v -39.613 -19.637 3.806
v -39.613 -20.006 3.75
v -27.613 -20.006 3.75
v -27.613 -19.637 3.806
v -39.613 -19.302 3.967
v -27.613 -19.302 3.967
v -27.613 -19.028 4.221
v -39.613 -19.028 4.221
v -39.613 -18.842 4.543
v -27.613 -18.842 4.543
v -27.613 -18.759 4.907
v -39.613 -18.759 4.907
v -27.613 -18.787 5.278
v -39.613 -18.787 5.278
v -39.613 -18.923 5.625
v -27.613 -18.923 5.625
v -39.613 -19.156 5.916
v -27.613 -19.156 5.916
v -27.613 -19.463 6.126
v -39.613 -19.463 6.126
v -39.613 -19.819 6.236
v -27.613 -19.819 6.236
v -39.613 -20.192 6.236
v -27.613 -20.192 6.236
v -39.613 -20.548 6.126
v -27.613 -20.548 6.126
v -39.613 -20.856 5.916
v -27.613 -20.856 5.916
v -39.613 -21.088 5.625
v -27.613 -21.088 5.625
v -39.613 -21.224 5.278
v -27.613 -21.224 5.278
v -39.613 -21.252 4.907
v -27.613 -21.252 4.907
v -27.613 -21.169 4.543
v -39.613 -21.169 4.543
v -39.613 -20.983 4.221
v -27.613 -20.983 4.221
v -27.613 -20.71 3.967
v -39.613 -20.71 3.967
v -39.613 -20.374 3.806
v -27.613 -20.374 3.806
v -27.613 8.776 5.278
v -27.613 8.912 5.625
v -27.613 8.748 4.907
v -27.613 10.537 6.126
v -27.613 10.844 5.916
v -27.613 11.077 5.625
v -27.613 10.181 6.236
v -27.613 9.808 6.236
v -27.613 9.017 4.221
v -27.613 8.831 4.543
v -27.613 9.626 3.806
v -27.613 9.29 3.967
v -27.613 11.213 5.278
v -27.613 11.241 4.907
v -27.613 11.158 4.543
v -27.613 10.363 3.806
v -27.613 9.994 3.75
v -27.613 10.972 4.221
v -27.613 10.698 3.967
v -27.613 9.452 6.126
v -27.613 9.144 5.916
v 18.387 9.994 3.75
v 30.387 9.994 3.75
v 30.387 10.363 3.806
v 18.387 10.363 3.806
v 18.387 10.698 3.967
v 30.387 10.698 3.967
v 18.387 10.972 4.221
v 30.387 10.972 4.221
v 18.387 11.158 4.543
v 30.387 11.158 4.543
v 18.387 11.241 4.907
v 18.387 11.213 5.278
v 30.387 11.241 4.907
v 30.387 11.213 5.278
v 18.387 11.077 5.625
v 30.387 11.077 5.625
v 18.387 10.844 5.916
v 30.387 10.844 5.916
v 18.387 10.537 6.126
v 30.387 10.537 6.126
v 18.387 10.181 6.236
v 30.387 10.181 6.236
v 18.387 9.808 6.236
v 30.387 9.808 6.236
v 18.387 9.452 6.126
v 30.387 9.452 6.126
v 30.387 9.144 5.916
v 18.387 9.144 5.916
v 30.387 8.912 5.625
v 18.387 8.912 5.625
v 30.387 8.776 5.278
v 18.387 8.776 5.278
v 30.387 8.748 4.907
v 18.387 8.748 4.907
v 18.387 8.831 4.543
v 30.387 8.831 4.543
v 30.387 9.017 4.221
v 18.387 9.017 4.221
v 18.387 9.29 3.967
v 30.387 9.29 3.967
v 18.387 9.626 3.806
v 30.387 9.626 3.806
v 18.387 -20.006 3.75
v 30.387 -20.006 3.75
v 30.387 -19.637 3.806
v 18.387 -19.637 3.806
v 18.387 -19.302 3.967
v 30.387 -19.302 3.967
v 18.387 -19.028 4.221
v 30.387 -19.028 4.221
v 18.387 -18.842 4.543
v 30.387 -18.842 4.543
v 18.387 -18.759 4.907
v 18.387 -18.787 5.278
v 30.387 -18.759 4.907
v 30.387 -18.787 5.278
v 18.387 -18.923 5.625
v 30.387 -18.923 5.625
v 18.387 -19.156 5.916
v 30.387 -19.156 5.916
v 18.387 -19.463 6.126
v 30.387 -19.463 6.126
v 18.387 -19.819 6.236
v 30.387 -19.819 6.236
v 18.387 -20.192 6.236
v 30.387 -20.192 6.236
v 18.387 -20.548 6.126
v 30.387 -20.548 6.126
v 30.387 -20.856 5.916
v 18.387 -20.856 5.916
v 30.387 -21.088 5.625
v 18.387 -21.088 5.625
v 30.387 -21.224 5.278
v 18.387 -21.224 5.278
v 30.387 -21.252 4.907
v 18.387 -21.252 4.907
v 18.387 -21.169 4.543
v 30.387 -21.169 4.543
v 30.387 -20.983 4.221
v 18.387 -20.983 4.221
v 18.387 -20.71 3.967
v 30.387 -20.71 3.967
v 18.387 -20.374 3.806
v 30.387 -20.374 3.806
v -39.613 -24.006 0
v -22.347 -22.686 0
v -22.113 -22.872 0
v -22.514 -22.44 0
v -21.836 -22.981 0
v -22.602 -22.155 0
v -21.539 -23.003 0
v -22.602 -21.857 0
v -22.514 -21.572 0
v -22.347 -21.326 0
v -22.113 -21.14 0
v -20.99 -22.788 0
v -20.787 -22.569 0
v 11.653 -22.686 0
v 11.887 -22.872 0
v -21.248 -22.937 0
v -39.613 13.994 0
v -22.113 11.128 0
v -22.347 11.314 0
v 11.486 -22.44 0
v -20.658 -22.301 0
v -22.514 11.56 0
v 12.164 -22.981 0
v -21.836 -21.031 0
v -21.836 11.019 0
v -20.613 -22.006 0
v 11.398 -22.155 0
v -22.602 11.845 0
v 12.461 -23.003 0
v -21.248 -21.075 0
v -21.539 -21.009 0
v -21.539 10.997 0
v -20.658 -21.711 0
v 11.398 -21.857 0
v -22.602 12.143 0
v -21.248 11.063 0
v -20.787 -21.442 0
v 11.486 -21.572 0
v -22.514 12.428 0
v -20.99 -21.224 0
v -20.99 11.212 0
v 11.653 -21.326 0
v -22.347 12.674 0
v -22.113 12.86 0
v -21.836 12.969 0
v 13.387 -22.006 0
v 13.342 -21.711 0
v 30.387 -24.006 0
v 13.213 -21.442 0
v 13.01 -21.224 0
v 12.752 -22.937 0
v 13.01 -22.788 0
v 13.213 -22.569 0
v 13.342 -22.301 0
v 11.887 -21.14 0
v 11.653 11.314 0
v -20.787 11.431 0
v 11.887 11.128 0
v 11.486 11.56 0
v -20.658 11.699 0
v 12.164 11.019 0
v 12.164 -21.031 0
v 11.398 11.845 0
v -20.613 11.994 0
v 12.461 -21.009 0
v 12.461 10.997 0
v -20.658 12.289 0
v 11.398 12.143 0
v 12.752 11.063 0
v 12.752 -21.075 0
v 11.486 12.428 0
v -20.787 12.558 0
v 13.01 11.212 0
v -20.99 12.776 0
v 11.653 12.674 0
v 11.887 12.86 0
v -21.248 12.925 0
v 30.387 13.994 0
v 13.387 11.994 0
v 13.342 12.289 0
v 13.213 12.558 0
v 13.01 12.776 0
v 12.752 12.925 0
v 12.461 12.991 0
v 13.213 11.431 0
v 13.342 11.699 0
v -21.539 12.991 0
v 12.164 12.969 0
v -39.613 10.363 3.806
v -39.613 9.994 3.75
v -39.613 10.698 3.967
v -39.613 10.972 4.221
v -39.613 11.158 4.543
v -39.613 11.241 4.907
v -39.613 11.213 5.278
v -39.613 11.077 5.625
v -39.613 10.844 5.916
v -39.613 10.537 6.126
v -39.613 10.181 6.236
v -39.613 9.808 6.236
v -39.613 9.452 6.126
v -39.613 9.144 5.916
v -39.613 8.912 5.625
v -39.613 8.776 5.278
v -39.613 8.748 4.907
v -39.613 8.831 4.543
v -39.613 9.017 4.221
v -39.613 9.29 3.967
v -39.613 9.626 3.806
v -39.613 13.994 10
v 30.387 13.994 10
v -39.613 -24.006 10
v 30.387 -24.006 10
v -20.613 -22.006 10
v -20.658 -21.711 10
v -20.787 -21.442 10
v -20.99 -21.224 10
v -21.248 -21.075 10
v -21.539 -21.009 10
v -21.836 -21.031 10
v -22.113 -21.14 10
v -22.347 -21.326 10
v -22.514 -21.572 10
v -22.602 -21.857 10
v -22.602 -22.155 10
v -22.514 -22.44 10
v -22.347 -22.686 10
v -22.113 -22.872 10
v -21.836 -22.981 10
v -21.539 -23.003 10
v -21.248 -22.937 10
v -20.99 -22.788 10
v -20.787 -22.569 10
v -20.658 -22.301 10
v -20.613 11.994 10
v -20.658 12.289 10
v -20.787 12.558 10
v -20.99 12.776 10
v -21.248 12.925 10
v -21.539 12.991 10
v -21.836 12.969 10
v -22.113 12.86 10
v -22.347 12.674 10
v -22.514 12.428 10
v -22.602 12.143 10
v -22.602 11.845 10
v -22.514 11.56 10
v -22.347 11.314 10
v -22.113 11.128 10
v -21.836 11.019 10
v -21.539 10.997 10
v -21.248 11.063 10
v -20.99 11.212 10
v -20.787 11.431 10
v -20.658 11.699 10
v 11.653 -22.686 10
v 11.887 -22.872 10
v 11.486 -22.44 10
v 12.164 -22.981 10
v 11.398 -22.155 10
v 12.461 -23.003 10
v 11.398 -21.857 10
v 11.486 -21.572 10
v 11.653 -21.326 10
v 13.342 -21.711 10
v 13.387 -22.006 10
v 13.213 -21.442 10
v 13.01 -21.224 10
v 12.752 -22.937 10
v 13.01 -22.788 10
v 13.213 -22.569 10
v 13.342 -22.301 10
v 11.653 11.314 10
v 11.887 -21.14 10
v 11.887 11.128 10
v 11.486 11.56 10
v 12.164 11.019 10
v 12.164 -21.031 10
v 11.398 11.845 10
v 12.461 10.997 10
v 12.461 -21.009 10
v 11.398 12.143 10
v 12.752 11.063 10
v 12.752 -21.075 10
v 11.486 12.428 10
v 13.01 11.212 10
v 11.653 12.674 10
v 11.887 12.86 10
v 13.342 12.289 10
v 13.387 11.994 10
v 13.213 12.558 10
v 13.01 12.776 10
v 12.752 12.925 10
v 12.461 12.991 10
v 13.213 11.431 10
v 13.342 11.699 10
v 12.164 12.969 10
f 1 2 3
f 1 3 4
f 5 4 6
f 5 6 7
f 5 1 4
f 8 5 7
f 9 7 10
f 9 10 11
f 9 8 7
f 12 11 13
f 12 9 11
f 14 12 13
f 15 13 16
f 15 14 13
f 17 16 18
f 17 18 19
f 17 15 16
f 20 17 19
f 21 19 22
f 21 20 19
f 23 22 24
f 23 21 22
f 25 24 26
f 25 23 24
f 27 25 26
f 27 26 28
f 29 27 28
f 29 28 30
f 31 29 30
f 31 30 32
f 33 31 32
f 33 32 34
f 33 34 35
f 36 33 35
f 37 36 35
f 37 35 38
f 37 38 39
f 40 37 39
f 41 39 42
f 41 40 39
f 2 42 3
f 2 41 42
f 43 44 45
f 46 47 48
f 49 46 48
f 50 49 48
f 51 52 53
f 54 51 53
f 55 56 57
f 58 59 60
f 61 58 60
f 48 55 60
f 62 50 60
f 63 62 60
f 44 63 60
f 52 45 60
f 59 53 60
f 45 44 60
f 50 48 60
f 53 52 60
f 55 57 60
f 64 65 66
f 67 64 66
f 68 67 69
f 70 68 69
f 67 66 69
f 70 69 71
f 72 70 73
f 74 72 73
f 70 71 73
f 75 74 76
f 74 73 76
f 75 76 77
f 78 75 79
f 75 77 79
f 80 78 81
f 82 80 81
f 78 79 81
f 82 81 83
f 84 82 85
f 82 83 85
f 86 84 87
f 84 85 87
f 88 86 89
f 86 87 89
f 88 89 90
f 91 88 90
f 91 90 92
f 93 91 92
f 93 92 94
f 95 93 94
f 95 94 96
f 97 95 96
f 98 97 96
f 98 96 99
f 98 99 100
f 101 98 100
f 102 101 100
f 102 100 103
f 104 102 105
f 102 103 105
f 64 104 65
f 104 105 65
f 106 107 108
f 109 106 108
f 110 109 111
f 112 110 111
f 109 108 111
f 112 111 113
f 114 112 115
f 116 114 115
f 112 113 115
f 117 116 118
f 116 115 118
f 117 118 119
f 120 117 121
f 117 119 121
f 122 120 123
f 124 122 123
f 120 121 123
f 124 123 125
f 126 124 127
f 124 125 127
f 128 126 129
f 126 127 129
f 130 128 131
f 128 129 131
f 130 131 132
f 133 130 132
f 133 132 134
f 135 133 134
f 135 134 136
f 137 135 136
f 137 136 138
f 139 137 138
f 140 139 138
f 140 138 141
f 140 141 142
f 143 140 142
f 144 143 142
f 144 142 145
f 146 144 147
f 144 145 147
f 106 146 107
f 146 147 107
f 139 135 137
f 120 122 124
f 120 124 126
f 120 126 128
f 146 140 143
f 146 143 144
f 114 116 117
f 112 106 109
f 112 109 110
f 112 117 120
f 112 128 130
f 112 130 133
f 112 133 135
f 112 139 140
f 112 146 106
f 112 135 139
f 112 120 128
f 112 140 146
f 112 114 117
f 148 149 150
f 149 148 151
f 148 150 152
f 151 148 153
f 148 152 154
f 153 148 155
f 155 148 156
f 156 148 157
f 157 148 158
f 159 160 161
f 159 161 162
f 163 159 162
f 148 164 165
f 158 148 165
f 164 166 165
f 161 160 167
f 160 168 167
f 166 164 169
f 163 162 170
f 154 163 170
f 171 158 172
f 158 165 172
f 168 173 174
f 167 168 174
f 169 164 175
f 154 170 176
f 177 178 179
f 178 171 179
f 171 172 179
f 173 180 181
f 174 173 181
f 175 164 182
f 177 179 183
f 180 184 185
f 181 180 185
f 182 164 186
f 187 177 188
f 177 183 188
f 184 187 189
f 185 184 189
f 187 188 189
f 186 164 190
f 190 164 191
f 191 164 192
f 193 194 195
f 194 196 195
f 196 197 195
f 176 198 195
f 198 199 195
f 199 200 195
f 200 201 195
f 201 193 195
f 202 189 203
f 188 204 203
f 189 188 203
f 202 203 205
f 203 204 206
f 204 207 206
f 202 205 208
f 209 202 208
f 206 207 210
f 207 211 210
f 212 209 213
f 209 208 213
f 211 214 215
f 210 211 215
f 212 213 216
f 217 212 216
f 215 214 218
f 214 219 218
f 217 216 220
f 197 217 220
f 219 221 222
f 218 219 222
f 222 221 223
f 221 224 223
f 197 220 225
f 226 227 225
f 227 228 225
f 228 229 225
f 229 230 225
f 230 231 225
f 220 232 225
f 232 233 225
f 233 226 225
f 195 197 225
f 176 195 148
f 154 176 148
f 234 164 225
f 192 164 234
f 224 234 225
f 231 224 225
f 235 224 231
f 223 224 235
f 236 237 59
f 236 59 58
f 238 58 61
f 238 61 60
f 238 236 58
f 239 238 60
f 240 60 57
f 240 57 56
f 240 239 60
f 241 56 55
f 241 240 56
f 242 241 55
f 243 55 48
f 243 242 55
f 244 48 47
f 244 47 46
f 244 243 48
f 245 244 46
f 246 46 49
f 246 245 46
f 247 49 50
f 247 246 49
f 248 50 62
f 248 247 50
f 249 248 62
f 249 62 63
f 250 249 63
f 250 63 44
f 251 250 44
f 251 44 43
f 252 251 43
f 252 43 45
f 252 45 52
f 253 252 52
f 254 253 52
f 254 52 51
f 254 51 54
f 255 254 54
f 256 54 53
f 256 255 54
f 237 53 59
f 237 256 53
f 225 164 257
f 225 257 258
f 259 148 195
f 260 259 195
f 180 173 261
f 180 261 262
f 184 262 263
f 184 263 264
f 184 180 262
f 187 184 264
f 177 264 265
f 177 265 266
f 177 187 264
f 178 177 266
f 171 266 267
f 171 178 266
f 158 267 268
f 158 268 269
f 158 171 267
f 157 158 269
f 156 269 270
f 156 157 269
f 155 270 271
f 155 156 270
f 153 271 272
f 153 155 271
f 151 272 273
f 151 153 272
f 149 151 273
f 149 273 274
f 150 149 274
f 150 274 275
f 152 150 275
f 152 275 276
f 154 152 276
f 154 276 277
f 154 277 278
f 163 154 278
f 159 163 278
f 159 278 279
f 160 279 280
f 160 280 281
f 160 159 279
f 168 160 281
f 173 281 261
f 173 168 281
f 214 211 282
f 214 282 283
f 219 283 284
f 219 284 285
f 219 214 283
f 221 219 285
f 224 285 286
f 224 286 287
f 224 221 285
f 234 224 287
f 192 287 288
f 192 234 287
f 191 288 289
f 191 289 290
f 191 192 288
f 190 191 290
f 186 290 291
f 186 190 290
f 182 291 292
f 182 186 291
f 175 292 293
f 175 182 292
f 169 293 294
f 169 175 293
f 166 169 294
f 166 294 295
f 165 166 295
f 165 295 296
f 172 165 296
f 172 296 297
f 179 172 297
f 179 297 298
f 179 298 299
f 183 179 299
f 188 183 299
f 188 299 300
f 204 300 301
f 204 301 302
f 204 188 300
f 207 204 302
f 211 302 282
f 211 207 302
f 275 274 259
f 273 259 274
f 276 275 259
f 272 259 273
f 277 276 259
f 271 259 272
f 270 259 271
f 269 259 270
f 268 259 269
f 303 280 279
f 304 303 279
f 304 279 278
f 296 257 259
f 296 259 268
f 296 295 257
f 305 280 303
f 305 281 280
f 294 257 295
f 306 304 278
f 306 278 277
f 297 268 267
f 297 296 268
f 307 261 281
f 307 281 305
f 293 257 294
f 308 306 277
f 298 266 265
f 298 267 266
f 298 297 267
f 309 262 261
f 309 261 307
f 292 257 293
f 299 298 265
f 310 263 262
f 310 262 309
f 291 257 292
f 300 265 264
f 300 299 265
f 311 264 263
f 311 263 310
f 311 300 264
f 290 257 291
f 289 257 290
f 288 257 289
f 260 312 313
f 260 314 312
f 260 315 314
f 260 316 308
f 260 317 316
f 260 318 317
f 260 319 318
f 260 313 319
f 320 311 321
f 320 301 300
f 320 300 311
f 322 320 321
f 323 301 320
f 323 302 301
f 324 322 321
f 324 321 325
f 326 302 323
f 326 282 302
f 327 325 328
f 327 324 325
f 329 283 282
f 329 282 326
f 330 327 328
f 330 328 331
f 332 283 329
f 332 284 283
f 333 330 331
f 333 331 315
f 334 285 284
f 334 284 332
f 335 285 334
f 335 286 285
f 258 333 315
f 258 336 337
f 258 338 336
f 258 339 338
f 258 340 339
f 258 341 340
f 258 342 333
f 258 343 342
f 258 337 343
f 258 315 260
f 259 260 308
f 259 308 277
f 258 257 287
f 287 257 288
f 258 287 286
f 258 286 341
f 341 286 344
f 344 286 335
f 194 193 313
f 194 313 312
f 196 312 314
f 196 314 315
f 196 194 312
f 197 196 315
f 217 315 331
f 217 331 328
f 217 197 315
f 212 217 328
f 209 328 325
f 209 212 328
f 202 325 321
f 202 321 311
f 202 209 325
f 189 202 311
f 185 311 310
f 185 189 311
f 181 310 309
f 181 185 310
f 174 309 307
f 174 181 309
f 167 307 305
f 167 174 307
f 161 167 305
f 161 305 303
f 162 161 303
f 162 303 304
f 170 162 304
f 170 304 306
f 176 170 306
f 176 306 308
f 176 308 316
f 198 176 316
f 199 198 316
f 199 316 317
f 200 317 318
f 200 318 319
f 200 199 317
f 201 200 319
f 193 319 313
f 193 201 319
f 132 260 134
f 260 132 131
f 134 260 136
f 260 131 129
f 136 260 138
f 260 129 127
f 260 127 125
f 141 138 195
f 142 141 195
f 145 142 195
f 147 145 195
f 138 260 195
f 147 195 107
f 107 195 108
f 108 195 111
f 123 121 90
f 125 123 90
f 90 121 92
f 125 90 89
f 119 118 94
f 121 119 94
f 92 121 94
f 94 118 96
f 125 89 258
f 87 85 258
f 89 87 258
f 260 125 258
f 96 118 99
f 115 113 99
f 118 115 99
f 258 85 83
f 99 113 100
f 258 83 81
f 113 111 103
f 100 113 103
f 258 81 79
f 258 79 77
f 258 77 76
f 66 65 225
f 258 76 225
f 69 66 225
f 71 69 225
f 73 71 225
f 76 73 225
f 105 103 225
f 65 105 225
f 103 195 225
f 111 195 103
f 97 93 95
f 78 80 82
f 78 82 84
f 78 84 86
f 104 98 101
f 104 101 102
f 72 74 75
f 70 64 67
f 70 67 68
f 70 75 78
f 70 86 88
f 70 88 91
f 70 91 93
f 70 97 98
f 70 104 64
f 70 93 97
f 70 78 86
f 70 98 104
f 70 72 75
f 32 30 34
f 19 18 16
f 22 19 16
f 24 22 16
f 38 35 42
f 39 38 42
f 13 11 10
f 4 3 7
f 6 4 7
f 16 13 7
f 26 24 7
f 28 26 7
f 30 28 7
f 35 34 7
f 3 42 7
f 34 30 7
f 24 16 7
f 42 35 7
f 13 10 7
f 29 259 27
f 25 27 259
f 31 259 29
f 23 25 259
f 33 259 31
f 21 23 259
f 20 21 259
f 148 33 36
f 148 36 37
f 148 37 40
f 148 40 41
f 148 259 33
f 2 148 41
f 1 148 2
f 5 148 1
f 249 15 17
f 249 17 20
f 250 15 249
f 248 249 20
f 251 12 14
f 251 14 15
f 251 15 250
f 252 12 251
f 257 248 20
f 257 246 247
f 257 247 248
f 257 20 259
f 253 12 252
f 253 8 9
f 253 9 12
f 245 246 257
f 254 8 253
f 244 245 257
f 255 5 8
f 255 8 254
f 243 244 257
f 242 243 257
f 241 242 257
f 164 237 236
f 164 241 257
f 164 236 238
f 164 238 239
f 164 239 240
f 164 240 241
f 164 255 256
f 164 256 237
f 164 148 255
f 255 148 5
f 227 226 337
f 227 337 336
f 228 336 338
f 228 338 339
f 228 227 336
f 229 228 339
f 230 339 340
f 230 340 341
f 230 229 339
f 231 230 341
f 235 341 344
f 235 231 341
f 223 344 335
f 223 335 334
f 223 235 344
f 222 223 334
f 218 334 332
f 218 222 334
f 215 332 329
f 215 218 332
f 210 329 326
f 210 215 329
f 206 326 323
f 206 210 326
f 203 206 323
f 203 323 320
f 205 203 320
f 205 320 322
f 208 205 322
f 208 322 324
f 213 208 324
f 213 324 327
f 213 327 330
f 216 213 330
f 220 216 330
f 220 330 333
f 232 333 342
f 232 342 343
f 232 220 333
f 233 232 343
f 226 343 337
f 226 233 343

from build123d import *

# Parameters (mm, degrees)
SKETCH1_W           = 70
SKETCH1_H           = 38
SKETCH1_R           = 1
BOSS_EXTRUDE1_DEPTH = 10
SKETCH2_R           = 1.25
CUT_EXTRUDE1_DEPTH  = 12


with BuildPart() as part:
    # Sketch1 → Boss-Extrude1 (new body)
    with BuildSketch(Plane.XY):
        with Locations((-4.613461538, -5.005769231)):
            Rectangle(SKETCH1_W, SKETCH1_H)
        with Locations((-21.613461538, 11.994230769)):
            Circle(SKETCH1_R, mode=Mode.SUBTRACT)
        with Locations((12.386538462, 11.994230769)):
            Circle(SKETCH1_R, mode=Mode.SUBTRACT)
        with Locations((12.386538462, -22.005769231)):
            Circle(SKETCH1_R, mode=Mode.SUBTRACT)
        with Locations((-21.613461538, -22.005769231)):
            Circle(SKETCH1_R, mode=Mode.SUBTRACT)
    extrude(amount=BOSS_EXTRUDE1_DEPTH)

    # Sketch2 → Cut-Extrude1 (cut)
    with BuildSketch(Plane(origin=(30.386538462, 0, 0), x_dir=(0, 0, -1), z_dir=(1, 0, 0))):
        with Locations((-5, 9.994230769)):
            Circle(SKETCH2_R)
        with Locations((-5, -20.005769231)):
            Circle(SKETCH2_R)
    cut_extrude1 = extrude(amount=-CUT_EXTRUDE1_DEPTH, mode=Mode.SUBTRACT)

    # Mirror1: Cut-Extrude1 across plane
    add(cut_extrude1.mirror(Plane.ZY.offset(4.613461538)), mode=Mode.SUBTRACT)


solid = part.part
